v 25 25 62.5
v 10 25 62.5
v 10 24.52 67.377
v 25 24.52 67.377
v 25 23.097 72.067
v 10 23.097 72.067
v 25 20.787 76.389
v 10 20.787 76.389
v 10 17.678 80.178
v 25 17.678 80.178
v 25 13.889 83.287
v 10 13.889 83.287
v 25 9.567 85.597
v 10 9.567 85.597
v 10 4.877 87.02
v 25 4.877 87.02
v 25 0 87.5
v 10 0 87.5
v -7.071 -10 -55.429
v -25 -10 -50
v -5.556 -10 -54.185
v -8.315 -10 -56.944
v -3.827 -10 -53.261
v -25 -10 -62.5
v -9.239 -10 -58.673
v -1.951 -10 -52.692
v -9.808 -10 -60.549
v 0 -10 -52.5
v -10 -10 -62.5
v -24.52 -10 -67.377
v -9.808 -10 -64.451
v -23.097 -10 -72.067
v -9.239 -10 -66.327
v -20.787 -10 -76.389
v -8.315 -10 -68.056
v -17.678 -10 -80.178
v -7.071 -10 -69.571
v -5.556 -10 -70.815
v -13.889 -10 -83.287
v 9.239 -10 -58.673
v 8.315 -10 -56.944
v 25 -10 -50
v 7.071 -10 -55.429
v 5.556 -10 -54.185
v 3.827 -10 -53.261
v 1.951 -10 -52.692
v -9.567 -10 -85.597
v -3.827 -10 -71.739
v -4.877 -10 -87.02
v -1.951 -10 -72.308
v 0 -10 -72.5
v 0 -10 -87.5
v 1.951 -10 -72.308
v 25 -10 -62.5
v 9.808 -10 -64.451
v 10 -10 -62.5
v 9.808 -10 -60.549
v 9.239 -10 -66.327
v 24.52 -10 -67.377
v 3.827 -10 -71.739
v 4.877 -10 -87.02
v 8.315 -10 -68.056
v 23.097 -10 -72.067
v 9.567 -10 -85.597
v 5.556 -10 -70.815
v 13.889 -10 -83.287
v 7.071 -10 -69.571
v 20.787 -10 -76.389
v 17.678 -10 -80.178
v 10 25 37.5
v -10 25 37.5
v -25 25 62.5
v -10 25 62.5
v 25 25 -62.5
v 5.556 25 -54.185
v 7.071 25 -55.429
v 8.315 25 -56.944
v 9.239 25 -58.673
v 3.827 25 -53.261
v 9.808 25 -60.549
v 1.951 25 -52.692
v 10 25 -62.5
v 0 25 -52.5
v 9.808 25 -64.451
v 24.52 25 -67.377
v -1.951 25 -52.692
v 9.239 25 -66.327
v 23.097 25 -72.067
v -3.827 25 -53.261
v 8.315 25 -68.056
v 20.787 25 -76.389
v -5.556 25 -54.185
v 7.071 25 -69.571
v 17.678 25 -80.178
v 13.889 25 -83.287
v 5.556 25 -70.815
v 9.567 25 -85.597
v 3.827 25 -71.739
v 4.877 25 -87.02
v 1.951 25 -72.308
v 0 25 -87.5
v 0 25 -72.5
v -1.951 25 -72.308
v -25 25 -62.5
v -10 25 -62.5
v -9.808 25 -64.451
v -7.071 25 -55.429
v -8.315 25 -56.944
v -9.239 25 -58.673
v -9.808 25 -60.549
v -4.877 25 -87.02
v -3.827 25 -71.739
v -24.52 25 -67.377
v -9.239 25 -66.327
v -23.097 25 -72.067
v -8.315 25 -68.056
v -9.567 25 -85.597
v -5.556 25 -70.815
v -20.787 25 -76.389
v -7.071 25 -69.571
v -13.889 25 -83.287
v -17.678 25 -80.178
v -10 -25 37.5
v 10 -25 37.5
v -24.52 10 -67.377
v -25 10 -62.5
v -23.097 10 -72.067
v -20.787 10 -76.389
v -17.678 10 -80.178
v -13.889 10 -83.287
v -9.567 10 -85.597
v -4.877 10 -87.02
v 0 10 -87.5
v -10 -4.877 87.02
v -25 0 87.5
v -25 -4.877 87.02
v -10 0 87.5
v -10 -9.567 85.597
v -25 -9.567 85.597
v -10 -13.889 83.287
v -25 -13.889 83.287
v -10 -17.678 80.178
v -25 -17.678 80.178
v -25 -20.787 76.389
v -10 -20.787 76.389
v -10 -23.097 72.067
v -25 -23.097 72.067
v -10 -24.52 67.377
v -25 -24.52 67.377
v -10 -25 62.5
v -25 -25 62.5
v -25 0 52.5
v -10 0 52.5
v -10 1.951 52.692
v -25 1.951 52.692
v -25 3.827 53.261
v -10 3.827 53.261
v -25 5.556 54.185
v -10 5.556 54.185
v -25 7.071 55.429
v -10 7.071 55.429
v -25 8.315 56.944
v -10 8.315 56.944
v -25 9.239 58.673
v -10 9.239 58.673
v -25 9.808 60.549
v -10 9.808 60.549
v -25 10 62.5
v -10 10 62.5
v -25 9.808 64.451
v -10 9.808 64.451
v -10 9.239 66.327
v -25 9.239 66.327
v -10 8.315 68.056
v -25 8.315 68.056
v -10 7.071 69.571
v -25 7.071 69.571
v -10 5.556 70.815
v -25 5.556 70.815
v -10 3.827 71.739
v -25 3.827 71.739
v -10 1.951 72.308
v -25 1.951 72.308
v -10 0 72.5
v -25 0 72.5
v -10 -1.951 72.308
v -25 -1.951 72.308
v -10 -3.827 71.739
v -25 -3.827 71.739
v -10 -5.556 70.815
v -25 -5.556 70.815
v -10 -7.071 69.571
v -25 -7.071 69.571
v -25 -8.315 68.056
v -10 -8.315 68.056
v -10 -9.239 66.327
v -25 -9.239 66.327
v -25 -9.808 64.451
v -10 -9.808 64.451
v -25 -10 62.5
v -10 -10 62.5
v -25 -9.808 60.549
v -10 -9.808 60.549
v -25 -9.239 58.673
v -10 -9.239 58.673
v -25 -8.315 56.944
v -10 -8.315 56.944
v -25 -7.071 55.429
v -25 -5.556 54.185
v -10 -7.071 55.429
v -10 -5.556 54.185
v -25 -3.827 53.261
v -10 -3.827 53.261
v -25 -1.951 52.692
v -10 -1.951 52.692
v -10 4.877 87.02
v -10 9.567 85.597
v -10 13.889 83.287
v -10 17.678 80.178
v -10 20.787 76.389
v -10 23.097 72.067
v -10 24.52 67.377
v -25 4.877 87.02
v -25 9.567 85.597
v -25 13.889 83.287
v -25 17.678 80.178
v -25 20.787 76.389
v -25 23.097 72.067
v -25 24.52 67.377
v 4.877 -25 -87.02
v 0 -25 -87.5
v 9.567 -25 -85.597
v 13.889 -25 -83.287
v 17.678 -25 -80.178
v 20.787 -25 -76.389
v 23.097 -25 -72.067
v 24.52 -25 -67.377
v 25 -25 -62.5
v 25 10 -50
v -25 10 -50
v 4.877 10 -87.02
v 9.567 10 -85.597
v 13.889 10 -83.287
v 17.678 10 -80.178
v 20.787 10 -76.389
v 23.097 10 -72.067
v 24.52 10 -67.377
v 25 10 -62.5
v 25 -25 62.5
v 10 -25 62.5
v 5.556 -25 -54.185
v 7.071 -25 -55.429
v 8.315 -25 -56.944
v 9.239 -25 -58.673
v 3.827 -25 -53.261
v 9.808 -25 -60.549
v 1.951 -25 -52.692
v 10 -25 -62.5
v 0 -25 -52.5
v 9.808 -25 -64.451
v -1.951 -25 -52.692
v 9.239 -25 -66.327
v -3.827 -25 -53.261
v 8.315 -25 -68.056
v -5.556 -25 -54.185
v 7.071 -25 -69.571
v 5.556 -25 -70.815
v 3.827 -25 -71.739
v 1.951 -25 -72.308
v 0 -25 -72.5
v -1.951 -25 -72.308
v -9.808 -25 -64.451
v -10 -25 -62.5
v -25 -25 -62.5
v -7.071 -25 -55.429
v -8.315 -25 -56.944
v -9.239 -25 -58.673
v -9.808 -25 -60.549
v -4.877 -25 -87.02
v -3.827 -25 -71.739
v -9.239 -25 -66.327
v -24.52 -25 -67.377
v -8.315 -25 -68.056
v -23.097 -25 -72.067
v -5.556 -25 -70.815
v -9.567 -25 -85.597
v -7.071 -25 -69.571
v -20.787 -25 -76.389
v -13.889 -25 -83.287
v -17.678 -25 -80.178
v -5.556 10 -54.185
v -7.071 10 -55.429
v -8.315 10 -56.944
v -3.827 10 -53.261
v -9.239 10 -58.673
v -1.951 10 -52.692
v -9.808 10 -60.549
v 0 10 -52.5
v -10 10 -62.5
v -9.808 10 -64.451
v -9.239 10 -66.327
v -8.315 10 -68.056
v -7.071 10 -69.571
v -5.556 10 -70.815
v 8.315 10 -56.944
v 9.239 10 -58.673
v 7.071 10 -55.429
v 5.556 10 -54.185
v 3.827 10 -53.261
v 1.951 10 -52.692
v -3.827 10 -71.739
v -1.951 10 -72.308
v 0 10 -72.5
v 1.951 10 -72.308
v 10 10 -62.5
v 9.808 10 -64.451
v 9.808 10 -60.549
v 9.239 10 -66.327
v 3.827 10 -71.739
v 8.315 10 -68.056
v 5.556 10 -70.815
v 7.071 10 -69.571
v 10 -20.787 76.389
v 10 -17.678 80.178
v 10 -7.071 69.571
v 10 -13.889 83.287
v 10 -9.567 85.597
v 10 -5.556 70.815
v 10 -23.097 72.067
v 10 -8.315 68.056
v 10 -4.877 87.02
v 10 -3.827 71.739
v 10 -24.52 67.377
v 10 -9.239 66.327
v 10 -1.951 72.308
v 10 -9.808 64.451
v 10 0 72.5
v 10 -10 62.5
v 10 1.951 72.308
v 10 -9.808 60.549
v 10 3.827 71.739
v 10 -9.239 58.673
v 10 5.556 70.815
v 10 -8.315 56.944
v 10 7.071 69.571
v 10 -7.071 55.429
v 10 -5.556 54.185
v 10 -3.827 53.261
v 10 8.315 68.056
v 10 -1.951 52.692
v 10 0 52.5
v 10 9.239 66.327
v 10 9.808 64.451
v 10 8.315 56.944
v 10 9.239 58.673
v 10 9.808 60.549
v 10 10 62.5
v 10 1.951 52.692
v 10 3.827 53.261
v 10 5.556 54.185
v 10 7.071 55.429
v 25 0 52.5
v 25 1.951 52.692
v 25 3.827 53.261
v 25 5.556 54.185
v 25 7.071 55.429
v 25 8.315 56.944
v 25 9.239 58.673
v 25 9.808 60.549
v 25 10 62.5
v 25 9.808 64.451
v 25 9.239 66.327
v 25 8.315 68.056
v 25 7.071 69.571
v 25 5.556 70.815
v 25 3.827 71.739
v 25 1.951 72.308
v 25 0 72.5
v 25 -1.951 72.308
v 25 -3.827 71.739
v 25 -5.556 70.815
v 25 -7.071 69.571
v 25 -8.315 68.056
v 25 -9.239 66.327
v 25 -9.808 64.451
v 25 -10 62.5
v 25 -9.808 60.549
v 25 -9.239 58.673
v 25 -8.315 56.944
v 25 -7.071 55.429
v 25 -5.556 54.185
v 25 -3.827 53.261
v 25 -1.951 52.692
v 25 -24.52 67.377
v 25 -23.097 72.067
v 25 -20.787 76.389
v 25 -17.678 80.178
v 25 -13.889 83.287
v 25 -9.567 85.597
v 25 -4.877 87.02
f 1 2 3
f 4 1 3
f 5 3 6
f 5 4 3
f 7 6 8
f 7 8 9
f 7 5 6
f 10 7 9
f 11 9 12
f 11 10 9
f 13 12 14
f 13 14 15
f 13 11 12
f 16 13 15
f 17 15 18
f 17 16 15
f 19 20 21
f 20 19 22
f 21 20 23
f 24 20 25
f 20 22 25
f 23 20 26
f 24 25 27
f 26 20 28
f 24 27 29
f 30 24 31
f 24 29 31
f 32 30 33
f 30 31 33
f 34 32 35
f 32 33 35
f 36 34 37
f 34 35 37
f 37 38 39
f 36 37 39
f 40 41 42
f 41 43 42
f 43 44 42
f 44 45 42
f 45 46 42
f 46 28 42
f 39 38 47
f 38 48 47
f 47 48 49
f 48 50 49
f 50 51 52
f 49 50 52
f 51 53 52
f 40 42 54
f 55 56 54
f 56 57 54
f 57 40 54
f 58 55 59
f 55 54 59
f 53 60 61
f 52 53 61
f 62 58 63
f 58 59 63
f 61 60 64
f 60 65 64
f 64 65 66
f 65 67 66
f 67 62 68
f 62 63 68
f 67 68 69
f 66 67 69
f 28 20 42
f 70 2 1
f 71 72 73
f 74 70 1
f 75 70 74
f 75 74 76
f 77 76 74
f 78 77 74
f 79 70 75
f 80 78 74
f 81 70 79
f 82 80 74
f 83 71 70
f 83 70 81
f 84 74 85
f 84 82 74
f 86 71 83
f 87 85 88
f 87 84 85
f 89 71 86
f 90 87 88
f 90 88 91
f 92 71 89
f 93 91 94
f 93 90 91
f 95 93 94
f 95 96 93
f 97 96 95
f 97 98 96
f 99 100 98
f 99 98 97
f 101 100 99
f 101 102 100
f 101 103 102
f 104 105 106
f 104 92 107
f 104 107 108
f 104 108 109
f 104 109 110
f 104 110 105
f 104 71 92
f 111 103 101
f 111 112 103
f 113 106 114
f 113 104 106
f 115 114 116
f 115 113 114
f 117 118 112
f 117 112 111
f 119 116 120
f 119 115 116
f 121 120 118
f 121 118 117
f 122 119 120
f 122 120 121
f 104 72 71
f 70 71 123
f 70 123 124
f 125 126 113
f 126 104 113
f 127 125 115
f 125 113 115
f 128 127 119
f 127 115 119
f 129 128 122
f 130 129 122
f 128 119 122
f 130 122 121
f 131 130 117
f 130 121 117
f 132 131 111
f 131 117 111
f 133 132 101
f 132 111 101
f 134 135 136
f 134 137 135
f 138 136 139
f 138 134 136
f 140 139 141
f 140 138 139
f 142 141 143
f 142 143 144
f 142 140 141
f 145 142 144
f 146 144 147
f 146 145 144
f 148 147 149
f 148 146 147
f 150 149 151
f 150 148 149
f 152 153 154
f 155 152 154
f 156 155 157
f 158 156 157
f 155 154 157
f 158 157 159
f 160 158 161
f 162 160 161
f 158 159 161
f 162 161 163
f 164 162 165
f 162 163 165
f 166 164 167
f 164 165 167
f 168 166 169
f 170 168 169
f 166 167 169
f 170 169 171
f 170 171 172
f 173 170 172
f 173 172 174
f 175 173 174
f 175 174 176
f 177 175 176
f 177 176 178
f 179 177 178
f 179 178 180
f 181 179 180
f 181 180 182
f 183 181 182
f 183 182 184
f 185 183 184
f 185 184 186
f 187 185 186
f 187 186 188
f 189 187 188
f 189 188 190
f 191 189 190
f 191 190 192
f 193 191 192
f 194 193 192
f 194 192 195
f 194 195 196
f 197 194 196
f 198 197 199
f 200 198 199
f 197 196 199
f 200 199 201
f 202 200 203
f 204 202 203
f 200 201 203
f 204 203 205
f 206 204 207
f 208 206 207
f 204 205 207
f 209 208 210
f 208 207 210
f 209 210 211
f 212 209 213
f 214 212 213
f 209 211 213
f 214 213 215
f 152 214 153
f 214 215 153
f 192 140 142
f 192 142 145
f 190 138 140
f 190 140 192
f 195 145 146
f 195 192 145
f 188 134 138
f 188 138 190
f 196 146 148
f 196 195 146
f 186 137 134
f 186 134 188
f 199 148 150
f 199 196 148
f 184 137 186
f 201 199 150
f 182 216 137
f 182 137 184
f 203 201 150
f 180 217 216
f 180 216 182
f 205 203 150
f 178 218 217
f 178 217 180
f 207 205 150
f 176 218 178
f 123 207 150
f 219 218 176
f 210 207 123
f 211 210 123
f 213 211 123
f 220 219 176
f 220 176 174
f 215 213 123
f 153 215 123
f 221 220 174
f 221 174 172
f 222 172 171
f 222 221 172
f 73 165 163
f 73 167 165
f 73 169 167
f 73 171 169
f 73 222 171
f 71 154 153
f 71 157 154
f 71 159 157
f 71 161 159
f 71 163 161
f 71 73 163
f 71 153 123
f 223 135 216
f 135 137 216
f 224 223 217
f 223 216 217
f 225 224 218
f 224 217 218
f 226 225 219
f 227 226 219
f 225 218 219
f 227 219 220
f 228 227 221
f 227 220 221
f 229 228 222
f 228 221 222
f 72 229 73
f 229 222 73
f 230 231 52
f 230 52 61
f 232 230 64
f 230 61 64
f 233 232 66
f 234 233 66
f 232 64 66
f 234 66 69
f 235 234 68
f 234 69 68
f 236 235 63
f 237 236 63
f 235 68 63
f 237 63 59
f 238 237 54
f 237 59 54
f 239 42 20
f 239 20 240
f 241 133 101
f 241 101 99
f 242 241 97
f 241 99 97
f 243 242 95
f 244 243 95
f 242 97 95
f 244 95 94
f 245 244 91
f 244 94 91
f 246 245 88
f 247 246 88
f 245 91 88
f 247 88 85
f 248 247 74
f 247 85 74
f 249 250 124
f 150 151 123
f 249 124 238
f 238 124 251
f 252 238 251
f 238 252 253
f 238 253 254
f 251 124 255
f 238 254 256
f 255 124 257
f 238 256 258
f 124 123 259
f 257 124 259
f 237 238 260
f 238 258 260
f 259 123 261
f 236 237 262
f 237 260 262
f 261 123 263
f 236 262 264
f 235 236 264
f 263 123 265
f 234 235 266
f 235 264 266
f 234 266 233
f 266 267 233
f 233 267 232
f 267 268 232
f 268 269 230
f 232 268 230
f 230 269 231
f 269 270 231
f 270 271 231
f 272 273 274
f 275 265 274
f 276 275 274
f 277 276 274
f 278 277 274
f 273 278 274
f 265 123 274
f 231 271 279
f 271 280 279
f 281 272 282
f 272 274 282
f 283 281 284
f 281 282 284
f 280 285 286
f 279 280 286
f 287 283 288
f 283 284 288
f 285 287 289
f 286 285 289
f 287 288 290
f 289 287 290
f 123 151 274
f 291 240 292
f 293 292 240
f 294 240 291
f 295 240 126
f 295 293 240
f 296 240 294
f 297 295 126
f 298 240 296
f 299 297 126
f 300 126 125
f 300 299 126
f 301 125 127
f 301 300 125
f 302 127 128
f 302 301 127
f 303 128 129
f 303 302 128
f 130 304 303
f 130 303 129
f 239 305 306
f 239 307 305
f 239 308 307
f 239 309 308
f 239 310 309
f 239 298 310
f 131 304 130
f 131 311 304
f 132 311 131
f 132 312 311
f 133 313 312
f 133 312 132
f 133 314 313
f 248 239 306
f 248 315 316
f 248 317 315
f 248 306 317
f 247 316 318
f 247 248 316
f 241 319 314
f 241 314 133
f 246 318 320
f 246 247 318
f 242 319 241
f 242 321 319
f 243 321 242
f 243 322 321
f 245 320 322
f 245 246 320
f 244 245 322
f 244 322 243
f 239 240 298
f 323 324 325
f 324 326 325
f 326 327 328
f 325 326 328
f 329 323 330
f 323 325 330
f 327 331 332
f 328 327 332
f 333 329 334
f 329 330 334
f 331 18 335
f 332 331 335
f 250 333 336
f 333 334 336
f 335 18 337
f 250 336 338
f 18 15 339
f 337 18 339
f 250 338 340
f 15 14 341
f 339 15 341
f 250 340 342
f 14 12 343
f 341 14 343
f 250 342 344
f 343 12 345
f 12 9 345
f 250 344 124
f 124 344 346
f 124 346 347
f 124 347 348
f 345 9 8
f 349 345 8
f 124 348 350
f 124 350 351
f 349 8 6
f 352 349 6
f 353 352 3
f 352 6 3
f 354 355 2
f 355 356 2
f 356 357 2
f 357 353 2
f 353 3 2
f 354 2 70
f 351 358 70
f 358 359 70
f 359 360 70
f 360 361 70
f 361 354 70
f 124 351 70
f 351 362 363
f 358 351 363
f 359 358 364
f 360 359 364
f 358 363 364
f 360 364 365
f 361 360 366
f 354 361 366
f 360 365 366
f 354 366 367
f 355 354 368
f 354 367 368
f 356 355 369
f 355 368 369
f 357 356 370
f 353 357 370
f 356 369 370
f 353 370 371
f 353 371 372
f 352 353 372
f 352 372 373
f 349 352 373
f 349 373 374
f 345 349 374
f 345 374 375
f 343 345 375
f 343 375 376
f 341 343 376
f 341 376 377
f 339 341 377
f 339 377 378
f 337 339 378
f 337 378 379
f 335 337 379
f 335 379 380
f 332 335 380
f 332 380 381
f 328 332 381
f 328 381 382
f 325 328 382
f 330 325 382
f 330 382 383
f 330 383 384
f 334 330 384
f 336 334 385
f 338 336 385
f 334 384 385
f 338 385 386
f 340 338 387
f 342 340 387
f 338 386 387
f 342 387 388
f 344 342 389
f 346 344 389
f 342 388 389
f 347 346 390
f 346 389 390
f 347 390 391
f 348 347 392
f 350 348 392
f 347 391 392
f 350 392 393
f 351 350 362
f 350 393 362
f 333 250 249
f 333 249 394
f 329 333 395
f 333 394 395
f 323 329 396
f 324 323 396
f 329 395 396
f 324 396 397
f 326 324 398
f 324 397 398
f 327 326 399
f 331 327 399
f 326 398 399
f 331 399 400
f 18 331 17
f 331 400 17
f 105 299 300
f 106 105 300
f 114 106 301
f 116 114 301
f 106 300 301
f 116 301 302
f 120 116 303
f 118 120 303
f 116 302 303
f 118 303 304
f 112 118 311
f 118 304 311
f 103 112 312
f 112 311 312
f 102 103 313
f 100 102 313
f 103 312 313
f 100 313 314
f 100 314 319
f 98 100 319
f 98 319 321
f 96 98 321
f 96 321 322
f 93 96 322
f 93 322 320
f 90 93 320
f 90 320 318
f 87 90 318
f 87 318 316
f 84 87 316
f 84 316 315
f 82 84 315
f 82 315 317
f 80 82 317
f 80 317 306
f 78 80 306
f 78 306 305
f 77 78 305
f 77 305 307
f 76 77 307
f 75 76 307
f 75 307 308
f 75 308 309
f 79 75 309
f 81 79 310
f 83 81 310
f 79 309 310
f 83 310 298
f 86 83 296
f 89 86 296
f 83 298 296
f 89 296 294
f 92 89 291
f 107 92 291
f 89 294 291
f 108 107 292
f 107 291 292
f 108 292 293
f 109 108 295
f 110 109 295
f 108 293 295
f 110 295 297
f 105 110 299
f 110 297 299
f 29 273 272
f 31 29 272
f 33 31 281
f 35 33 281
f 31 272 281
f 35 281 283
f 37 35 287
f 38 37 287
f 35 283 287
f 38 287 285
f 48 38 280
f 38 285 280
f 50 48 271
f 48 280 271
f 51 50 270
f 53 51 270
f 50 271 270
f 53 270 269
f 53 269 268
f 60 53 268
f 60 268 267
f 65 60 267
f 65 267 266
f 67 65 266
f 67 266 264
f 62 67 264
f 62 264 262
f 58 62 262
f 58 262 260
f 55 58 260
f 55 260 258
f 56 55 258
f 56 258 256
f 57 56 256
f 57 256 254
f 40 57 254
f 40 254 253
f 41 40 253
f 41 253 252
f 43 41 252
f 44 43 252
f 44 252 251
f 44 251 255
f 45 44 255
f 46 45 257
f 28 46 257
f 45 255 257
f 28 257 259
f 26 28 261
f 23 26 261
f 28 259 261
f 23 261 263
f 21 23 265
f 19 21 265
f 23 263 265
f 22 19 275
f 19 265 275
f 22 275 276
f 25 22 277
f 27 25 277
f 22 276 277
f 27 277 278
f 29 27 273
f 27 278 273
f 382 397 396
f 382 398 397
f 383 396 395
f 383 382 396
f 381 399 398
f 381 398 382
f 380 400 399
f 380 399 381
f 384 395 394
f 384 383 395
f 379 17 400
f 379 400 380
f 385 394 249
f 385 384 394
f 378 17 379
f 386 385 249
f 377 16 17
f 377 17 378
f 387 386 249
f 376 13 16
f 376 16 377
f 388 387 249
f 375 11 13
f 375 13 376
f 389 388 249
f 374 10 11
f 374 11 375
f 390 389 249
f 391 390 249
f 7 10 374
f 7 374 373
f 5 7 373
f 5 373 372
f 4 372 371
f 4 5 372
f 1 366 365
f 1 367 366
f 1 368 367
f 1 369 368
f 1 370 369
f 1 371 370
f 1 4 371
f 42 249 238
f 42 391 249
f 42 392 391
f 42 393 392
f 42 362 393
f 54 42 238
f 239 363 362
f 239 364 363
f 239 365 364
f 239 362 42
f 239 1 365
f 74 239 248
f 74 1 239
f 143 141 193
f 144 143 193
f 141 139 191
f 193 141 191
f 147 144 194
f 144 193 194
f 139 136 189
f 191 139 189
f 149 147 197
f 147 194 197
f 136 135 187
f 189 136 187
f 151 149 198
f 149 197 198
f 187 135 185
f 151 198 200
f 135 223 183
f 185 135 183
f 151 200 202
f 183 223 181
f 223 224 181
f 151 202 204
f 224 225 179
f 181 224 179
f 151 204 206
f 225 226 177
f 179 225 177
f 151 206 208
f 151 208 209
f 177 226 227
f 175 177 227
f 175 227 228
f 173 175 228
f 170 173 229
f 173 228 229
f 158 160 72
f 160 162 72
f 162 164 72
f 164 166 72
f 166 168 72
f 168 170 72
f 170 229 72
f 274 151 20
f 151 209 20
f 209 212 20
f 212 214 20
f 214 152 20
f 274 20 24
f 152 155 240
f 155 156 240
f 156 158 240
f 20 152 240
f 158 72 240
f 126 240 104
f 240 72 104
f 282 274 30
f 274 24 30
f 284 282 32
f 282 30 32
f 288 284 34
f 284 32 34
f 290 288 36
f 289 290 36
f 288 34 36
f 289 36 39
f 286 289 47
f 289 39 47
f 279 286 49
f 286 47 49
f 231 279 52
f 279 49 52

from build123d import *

# Parameters (mm, degrees)
BOSS_EXTRUDE1_DEPTH      = 25
BOSS_EXTRUDE1_DEPTH_BACK = 25
SKETCH1_W                = 175
SKETCH1_H                = 50
SKETCH2_W                = 20
SKETCH2_H                = 50
CUT_EXTRUDE1_DEPTH       = 104.832798286
FILLET2_R                = 25
SKETCH3_W                = 56.175036023
SKETCH3_H                = 20
CUT_EXTRUDE2_DEPTH       = 104.832798286
FILLET6_R                = 25
HOLE1_D                  = 20
HOLE2_D                  = 20


with BuildPart() as part:
    # Sketch1 → Boss-Extrude1 (new, two sides: drawn at the far end of the back side and taken through both)
    with BuildSketch(Plane(origin=(0, 0, 0), x_dir=(0, 0, -1), z_dir=(1, 0, 0)).offset(-BOSS_EXTRUDE1_DEPTH_BACK)):
        Rectangle(SKETCH1_W, SKETCH1_H)
    extrude(amount=BOSS_EXTRUDE1_DEPTH + BOSS_EXTRUDE1_DEPTH_BACK)

    # Sketch2 → Cut-Extrude1 (cut, through all)
    with BuildSketch(Plane(origin=(0, 25, 0), x_dir=(1, 0, 0), z_dir=(0, 1, 0))):
        with Locations((0, -62.5)):
            Rectangle(SKETCH2_W, SKETCH2_H)
    extrude(amount=-CUT_EXTRUDE1_DEPTH, mode=Mode.SUBTRACT)

    # Fillet2
    fillet2_edges = [part.edges().sort_by_distance(p)[0] for p in [
        (-17.5, 25, 87.5),
        (17.5, 25, 87.5),
        (-17.5, -25, 87.5),
        (17.5, -25, 87.5),
    ]]
    fillet(fillet2_edges, radius=FILLET2_R - 0.0001)  # a hair under: the kernel refuses the full size

    # Sketch3 → Cut-Extrude2 (cut, through all)
    with BuildSketch(Plane(origin=(25, 0, 0), x_dir=(0, 0, -1), z_dir=(1, 0, 0))):
        with Locations((78.087518012, 0)):
            Rectangle(SKETCH3_W, SKETCH3_H)
    extrude(amount=-CUT_EXTRUDE2_DEPTH, mode=Mode.SUBTRACT)

    # Fillet6
    fillet6_edges = [part.edges().sort_by_distance(p)[0] for p in [
        (25, 17.5, -87.5),
        (25, -17.5, -87.5),
        (-25, -17.5, -87.5),
        (-25, 17.5, -87.5),
    ]]
    fillet(fillet6_edges, radius=FILLET6_R - 0.0001)  # a hair under: the kernel refuses the full size

    # Hole1 (through all)
    with Locations(Plane(origin=(0, 25, 0), x_dir=(1, 0, 0), z_dir=(0, 1, 0))):
        with Locations((0, 62.5)):
            Hole(HOLE1_D / 2)

    # Hole2 (through all)
    with Locations(Plane.ZY.offset(25)):
        with Locations((62.5, 0)):
            Hole(HOLE2_D / 2)


solid = part.part
